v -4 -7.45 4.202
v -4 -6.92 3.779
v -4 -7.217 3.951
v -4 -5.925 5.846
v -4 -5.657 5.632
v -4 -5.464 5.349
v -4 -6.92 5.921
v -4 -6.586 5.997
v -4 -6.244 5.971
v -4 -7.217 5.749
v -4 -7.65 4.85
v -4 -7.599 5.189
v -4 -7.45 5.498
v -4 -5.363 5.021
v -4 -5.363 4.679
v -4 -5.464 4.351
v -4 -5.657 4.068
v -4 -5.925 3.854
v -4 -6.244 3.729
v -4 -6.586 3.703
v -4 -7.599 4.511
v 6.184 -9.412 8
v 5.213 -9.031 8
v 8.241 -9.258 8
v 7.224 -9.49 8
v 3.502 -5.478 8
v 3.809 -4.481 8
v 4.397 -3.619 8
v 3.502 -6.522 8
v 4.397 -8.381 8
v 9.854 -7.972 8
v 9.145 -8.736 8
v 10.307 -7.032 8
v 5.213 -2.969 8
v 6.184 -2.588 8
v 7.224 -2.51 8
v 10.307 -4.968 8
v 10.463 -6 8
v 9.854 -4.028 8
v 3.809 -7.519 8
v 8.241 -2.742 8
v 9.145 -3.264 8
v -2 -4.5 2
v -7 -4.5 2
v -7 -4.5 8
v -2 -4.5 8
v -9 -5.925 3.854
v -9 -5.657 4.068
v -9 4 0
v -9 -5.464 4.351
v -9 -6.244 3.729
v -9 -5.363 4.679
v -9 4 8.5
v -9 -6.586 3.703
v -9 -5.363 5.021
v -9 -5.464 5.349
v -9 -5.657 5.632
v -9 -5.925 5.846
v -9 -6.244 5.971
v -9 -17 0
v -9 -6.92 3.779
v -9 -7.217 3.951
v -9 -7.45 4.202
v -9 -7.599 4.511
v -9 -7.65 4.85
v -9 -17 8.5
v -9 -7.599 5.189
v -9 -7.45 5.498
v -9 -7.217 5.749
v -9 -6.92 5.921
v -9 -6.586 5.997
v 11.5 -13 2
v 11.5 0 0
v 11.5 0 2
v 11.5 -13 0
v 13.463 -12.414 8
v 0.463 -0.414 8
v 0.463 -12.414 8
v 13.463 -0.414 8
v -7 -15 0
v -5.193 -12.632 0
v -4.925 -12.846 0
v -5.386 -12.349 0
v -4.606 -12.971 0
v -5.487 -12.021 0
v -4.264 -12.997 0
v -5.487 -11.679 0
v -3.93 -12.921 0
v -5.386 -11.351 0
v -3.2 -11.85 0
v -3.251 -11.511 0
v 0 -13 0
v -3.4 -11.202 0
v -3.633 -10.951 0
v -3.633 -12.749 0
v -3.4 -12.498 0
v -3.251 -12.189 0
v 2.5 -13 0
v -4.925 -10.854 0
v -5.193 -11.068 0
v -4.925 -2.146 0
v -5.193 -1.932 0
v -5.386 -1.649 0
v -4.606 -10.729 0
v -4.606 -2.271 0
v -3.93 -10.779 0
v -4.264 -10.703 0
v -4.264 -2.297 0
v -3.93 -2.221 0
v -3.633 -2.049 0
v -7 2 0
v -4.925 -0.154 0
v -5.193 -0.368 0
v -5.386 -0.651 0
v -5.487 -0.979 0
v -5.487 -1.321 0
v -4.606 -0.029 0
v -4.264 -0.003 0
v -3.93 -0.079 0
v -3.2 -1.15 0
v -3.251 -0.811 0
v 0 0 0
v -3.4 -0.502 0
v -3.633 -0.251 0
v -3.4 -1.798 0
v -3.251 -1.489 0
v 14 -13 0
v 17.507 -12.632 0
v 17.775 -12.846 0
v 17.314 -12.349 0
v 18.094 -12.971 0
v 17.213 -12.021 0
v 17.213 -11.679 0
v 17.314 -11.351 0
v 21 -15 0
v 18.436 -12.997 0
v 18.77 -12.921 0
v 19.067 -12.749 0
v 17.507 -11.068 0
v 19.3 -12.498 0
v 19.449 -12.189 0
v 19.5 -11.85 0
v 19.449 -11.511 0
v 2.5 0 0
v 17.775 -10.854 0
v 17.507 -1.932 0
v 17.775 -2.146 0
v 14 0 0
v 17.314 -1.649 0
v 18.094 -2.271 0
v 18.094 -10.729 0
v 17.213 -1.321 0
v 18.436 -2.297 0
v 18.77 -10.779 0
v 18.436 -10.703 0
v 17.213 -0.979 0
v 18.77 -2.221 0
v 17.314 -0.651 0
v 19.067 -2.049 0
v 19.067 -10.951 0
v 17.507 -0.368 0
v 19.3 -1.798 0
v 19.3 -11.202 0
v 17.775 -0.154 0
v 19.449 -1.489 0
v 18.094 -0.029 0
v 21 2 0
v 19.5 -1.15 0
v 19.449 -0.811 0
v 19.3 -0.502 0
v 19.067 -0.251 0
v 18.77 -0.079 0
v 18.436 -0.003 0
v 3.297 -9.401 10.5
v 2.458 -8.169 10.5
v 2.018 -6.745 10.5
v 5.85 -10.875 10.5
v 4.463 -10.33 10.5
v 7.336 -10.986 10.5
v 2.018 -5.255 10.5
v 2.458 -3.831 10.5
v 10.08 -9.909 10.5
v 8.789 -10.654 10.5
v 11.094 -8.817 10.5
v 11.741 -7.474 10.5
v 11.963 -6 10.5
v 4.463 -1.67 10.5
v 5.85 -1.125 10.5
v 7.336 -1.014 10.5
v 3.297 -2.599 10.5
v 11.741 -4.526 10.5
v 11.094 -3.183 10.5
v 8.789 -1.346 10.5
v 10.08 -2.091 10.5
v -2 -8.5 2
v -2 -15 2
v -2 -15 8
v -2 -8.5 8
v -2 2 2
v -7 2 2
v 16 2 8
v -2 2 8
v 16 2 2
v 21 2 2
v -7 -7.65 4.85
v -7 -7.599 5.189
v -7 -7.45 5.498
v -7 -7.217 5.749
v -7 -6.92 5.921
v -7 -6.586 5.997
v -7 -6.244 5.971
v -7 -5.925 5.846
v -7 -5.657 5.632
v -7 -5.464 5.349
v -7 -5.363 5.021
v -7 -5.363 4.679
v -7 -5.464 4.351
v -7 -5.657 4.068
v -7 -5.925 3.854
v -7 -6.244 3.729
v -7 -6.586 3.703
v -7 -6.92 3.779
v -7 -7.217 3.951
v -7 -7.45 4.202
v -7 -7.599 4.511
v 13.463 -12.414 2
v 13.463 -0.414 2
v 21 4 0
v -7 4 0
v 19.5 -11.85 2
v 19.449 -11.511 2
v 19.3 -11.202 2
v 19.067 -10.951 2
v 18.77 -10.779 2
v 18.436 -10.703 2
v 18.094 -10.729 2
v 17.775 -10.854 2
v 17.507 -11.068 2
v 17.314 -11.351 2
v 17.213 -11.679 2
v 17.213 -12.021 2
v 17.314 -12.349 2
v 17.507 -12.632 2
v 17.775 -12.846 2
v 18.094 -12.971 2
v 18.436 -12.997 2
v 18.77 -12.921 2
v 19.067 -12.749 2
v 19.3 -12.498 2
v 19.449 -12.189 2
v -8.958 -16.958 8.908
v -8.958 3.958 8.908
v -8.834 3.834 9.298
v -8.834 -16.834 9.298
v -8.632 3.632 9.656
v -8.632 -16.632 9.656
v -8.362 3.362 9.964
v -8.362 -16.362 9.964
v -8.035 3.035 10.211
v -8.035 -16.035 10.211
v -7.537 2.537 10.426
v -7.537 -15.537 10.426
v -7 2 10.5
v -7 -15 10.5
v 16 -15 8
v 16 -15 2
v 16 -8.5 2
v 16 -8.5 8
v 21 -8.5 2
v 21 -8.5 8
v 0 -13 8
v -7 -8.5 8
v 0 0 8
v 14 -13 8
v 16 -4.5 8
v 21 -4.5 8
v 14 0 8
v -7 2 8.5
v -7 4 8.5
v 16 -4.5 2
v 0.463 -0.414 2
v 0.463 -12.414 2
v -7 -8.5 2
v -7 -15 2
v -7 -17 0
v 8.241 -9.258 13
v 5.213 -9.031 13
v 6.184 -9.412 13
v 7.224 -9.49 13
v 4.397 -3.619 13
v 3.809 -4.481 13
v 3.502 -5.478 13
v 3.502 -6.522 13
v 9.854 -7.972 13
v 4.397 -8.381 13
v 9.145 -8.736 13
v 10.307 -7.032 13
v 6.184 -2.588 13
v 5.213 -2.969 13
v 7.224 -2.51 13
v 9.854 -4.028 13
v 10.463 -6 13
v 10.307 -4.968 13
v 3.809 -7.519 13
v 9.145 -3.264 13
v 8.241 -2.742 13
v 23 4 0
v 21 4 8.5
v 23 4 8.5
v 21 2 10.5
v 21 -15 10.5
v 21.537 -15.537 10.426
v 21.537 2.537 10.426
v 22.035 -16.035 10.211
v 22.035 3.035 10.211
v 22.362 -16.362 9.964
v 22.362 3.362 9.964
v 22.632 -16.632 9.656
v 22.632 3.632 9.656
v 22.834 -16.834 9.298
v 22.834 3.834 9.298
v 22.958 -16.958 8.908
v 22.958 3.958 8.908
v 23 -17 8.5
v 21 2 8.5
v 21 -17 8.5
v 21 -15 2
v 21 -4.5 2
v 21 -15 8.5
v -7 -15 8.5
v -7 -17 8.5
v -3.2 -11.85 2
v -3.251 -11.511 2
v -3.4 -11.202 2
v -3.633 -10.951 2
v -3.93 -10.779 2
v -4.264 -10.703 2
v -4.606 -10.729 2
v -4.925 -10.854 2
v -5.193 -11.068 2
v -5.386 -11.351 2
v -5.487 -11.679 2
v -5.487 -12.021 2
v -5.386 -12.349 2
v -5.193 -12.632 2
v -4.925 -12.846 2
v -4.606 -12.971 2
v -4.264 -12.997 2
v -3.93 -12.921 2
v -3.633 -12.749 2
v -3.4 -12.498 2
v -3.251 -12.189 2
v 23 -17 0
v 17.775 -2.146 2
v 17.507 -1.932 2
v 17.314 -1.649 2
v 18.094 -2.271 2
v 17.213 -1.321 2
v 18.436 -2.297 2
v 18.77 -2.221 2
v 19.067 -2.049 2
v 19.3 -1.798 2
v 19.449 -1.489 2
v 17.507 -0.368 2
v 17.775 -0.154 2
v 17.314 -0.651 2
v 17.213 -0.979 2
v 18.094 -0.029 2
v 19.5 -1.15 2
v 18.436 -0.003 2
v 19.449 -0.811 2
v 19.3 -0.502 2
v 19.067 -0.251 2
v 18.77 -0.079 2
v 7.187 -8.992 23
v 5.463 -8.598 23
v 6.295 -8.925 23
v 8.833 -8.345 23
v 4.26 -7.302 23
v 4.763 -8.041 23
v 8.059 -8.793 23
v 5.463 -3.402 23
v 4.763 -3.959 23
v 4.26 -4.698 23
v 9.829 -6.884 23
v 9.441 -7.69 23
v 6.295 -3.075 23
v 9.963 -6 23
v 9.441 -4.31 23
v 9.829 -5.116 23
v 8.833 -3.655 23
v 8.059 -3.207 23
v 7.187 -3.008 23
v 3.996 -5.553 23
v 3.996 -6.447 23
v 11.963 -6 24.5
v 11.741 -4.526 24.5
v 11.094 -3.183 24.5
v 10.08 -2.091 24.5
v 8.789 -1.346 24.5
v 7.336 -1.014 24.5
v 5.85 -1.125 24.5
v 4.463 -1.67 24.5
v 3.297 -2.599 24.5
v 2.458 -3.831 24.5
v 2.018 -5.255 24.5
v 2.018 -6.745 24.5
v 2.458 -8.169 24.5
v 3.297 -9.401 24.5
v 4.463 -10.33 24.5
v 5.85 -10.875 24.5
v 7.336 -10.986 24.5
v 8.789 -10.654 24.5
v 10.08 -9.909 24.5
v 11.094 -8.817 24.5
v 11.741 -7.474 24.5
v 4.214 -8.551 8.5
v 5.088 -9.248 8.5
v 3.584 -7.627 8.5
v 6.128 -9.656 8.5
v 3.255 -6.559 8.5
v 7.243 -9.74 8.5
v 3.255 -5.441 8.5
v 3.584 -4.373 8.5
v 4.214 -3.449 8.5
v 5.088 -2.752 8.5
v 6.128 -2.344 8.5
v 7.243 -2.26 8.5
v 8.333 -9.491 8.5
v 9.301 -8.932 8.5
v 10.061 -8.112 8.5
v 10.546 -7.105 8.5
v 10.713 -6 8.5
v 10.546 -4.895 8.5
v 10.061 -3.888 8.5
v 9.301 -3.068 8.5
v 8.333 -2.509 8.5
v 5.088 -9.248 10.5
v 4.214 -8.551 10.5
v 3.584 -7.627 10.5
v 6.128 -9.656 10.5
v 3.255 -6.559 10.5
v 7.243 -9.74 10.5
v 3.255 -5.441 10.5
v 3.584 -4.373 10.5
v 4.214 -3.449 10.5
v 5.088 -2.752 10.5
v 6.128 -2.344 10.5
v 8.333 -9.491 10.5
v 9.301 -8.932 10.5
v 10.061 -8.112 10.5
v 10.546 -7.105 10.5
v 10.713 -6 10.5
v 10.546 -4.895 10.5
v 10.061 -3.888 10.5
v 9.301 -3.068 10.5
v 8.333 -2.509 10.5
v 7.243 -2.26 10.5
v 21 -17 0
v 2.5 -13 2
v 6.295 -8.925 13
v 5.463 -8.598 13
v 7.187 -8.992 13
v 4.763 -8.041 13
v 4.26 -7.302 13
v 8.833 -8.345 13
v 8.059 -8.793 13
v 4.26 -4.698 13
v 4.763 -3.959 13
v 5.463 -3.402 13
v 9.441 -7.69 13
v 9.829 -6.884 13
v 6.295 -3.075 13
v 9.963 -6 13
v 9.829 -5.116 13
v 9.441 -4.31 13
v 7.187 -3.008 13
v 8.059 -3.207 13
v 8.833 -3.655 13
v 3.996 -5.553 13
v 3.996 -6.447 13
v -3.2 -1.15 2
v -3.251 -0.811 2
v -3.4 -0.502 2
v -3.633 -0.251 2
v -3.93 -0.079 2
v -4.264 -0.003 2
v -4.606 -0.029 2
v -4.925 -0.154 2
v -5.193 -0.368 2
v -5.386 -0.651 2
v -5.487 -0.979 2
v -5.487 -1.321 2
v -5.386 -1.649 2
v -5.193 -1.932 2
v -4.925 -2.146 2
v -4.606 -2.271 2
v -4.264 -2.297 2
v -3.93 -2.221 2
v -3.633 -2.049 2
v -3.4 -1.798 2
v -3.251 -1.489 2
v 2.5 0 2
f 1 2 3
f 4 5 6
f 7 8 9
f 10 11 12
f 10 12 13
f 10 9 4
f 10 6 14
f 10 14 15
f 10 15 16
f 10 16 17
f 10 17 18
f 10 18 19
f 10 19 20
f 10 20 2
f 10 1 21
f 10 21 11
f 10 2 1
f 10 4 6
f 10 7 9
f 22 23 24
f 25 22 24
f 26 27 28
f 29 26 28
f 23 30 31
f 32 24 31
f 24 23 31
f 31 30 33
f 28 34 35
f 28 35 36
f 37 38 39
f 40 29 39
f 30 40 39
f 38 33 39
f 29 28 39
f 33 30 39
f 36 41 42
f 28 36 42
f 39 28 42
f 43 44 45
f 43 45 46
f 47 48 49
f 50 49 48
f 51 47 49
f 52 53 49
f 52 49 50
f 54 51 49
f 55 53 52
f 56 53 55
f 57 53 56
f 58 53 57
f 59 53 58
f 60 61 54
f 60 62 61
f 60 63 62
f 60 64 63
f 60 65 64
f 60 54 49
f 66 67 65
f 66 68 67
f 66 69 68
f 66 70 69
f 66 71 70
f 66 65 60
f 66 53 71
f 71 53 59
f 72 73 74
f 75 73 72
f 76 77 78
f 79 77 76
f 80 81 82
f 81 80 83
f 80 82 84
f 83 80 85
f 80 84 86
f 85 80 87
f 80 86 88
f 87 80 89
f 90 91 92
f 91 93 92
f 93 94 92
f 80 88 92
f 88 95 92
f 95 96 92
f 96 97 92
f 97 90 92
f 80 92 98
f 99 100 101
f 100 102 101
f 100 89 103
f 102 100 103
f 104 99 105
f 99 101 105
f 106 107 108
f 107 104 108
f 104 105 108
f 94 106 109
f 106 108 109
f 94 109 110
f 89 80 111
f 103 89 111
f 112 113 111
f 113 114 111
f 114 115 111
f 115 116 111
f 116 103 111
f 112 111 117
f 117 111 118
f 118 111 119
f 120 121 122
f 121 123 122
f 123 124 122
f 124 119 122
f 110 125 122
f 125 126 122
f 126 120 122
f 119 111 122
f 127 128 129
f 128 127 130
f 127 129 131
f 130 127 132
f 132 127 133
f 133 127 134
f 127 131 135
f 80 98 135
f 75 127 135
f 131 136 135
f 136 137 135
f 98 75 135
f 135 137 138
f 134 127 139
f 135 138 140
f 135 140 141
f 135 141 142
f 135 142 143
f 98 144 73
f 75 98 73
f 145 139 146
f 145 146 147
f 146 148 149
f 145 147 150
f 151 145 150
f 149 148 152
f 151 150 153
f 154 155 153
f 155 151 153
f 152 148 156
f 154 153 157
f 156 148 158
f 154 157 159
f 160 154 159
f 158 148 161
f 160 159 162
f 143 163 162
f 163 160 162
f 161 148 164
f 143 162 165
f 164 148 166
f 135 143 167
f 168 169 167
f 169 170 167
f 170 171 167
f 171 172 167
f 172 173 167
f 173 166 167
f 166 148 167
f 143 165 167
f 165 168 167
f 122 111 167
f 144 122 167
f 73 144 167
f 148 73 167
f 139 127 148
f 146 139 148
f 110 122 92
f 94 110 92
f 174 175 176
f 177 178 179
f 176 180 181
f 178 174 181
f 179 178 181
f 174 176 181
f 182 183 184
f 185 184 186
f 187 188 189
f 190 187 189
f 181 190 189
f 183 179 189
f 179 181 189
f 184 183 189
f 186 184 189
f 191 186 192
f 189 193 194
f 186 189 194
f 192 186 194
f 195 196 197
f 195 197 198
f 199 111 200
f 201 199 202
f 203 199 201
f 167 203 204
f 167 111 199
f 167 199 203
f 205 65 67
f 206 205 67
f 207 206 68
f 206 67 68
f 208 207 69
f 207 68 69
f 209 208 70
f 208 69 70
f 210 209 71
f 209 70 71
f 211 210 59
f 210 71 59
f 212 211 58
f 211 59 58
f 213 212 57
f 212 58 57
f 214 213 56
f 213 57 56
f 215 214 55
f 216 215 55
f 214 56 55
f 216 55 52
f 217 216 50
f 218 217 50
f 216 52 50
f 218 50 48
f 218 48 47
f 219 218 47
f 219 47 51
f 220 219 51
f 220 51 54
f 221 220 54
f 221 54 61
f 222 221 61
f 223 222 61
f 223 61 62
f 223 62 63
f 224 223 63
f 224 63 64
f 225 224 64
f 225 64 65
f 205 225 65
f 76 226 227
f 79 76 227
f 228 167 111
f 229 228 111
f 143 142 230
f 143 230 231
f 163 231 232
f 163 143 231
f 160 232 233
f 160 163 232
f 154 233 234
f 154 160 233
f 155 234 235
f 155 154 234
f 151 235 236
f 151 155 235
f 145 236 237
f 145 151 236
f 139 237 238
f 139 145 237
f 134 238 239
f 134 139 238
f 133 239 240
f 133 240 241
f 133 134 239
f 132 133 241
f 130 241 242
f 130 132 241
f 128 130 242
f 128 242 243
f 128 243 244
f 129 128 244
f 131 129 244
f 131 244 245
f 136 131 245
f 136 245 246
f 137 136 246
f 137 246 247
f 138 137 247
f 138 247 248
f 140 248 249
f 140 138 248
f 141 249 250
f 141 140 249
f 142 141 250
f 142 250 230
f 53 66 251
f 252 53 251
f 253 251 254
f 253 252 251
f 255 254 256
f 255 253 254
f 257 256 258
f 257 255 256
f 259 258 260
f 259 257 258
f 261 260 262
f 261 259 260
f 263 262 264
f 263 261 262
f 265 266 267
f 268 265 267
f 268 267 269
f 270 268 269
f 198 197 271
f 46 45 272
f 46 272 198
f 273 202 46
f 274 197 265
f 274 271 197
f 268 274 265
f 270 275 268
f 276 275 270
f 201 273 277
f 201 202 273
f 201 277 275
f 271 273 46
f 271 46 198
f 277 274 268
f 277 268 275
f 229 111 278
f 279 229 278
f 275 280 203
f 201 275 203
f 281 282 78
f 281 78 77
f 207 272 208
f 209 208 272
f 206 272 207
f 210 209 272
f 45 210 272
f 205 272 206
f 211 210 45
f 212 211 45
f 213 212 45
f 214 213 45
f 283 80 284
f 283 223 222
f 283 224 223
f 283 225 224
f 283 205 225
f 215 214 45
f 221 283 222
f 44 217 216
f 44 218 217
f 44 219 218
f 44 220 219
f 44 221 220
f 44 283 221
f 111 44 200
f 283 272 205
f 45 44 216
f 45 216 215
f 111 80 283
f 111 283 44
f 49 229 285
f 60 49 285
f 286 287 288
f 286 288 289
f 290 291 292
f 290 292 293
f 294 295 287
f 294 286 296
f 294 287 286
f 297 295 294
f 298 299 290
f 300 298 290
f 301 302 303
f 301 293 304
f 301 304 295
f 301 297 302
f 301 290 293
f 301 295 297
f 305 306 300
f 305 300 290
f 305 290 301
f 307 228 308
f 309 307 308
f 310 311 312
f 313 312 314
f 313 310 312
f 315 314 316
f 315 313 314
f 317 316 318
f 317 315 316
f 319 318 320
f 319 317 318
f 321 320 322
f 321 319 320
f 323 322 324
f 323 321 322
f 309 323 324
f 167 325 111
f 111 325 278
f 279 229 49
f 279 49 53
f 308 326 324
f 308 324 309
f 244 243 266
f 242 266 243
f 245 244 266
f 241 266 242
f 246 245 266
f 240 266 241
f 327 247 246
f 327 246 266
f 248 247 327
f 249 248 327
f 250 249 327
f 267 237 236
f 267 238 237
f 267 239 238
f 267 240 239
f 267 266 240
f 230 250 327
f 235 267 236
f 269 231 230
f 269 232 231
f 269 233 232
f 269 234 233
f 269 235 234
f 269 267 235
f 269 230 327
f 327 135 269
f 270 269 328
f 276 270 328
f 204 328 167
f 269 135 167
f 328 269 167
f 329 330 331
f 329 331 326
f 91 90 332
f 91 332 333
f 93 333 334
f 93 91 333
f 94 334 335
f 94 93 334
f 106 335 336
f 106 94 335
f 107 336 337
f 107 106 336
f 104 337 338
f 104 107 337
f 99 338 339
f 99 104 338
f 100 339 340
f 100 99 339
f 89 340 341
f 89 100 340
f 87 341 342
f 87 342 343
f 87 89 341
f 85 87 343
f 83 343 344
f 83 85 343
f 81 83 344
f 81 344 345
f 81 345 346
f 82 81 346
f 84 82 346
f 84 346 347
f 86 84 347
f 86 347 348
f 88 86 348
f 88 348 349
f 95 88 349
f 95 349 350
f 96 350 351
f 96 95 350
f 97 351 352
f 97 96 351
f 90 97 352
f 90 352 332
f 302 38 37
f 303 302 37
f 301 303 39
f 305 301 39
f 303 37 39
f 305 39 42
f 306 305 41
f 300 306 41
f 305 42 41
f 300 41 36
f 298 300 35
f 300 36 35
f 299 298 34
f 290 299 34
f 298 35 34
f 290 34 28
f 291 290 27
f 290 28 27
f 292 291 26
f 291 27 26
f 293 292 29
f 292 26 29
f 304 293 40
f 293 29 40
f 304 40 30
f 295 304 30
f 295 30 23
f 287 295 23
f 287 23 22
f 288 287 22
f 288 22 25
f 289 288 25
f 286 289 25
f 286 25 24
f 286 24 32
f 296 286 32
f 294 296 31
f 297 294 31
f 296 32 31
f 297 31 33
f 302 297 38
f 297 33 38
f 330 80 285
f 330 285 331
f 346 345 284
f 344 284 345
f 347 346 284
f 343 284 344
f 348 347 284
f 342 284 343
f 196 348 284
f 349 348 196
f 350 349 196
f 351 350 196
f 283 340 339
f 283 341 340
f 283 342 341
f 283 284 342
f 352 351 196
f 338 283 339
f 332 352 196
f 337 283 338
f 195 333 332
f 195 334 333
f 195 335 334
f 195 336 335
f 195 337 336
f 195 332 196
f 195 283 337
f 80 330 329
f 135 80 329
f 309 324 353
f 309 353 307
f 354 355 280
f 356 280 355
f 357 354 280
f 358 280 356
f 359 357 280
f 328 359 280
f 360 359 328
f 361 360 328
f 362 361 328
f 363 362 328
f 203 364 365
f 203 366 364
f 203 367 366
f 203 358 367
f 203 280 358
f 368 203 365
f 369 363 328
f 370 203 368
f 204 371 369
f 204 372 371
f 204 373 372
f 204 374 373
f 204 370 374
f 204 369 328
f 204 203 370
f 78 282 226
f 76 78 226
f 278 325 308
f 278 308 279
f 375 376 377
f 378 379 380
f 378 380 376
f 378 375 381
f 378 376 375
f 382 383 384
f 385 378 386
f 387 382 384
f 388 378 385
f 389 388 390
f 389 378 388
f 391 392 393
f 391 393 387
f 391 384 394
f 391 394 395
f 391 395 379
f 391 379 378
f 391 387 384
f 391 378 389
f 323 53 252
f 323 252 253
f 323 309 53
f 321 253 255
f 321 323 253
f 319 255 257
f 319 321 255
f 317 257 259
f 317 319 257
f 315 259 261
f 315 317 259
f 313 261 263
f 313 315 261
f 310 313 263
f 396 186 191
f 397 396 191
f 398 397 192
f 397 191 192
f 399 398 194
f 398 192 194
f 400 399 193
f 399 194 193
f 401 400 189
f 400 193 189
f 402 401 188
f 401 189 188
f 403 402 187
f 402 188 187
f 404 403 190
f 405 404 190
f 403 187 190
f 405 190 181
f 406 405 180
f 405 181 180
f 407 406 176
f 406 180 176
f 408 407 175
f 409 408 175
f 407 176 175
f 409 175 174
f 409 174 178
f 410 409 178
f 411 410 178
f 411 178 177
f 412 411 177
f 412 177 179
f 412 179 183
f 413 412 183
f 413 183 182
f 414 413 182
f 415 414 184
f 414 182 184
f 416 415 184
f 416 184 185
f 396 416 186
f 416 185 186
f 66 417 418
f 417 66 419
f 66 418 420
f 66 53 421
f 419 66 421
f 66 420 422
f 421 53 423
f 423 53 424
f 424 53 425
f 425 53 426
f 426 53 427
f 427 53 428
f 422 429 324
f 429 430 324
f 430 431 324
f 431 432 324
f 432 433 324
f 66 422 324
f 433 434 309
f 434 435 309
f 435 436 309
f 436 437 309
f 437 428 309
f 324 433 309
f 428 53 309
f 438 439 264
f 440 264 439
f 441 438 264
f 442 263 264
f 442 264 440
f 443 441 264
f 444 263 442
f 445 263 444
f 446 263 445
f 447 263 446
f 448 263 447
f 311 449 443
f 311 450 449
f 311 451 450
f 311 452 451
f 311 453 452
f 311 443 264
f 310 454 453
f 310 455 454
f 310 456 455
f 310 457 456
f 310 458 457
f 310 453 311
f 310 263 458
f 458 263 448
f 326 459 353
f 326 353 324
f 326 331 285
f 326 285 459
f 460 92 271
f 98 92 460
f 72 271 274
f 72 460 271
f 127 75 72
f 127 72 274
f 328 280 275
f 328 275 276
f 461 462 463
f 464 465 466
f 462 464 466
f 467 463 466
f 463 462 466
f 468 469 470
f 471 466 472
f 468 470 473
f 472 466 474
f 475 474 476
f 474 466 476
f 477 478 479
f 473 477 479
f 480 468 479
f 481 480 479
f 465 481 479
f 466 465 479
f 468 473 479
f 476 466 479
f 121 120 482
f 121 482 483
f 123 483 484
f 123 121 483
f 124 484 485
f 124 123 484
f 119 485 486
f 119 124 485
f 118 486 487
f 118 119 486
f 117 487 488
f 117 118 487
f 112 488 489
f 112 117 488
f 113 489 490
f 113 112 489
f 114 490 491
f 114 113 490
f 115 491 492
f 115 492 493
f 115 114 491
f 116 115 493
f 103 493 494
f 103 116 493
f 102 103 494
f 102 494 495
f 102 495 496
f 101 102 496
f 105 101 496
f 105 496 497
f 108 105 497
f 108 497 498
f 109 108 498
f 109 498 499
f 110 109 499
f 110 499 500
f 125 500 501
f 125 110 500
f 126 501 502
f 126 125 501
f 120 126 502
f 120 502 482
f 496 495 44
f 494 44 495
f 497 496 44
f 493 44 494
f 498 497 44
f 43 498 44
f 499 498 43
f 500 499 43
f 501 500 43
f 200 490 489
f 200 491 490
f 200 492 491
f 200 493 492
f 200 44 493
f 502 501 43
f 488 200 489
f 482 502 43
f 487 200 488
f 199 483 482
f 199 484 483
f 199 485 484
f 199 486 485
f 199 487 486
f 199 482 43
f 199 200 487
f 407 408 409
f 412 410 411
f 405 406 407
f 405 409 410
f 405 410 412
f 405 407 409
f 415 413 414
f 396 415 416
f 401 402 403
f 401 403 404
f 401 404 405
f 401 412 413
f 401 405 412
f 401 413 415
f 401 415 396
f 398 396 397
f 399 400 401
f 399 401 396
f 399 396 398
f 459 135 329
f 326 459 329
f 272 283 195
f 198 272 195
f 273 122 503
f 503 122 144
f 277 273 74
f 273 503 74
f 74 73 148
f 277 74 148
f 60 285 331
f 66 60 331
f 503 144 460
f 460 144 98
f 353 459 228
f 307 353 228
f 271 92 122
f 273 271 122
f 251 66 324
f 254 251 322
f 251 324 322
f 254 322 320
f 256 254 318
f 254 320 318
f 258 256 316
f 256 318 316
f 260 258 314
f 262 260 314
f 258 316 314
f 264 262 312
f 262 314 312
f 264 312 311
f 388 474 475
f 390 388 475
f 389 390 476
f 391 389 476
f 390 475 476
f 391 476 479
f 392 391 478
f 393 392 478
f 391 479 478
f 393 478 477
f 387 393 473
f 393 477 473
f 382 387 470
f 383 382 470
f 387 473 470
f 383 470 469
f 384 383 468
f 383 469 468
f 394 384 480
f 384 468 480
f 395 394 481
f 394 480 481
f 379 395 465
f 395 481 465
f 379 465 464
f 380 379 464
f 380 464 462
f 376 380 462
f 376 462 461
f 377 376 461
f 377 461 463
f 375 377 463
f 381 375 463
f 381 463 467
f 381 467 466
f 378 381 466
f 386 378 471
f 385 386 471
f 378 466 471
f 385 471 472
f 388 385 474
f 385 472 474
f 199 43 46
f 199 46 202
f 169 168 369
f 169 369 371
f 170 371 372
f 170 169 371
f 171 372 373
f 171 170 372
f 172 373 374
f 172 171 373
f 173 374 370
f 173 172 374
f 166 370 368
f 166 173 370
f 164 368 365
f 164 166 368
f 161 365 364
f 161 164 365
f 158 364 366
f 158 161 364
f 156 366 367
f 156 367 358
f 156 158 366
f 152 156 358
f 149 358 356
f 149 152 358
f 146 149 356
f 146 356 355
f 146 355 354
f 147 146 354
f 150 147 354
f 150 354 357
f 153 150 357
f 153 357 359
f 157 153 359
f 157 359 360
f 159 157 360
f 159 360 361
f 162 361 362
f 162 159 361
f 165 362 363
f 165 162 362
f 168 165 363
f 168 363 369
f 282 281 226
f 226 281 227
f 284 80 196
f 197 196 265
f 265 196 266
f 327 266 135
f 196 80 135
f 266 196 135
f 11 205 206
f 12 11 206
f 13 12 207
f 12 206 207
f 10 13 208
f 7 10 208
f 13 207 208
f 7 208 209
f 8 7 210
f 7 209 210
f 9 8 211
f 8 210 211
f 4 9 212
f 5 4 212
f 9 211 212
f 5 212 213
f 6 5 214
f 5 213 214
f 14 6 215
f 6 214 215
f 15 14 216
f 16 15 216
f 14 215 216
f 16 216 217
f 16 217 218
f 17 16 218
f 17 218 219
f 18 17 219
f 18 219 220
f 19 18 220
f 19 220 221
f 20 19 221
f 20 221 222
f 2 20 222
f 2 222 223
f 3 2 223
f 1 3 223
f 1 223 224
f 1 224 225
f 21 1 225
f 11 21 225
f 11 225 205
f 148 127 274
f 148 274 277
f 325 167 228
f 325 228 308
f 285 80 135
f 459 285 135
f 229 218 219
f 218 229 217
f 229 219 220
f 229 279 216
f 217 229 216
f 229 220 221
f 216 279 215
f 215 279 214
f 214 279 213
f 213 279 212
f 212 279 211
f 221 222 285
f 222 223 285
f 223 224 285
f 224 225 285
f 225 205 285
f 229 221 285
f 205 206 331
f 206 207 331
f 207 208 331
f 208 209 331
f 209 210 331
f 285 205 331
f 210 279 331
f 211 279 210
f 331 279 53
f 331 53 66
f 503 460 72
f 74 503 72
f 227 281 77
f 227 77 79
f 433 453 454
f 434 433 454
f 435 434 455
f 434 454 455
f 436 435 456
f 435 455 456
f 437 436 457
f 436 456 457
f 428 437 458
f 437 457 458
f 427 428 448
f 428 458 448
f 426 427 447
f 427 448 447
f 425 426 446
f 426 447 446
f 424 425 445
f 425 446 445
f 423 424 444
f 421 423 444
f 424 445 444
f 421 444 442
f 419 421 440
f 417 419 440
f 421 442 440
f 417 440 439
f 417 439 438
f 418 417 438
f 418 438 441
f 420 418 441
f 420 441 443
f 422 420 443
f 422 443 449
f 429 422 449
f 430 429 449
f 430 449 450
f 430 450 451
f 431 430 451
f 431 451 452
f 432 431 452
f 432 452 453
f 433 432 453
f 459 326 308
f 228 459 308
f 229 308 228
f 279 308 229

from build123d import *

# Parameters (mm, degrees)
F0_W      = 18
F0_H      = 17
F0_W_2    = 14
F0_H_2    = 13
F1_DEPTH  = 8
F2_W      = 9
F2_H      = 13
F3_DEPTH  = 2
F5_W      = 13
F5_H      = 12
F6_DEPTH  = 6
F7_R      = 3.5
F8_DEPTH  = 5
F9_R      = 3
F10_DEPTH = 10
F11_W     = 5
F11_H     = 17
F11_R     = 1.15
F12_DEPTH = 2
F13_W     = 5
F13_H     = 4
F14_DEPTH = 6
F15_W     = 28
F15_H     = 8.5
F16_DEPTH = 2
F17_W     = 21
F17_H     = 8.5
F18_DEPTH = 2
F19_W     = 28
F19_H     = 8.5
F20_DEPTH = 2
F21_W     = 21
F21_H     = 8.5
F22_DEPTH = 2
F23_R     = 1.15
F24_DEPTH = 5
F25_W     = 32
F25_H     = 21
F26_DEPTH = 2
F27_R     = 3.75
F28_DEPTH = 5
F29_R     = 5
F30_DEPTH = 14
F31_R     = 1.99999


# Not quite as in the source:
# - a fillet or chamfer is up to 0.001 mm smaller than in the source, because OpenCascade refuses the exact size


with BuildPart() as f1:
    # F0 (on Top) → F1 (new body)
    with BuildSketch(Plane.XY):
        with Locations((7, -6.5)):
            Rectangle(F0_W, F0_H)
        with Locations((7, -6.5)):
            Rectangle(F0_W_2, F0_H_2, mode=Mode.SUBTRACT)
    extrude(amount=F1_DEPTH)

    # F2 (on face) → F3 (join)
    with BuildSketch(Plane(origin=(0, 0, 0), x_dir=(1, 0, 0), z_dir=(0, 0, -1))):
        with Locations((7, 6.5)):
            Rectangle(F2_W, F2_H)
    extrude(amount=-F3_DEPTH)

    # F11 (on Top) → F12 (join)
    with BuildSketch(Plane.XY):
        with Locations((-4.5, -6.5)):
            Rectangle(F11_W, F11_H)
        with Locations((-4.35, -11.85)):
            Circle(F11_R, mode=Mode.SUBTRACT)
        with Locations((-4.35, -1.15)):
            Circle(F11_R, mode=Mode.SUBTRACT)
        with Locations((18.5, -6.5)):
            Rectangle(F11_W, F11_H)
        with Locations((18.35, -11.85)):
            Circle(F11_R, mode=Mode.SUBTRACT)
        with Locations((18.35, -1.15)):
            Circle(F11_R, mode=Mode.SUBTRACT)
    extrude(amount=F12_DEPTH)

    # F13 (on face) → F14 (join)
    with BuildSketch(Plane.XY.offset(2)):
        with Locations((-4.5, -6.5)):
            Rectangle(F13_W, F13_H)
        with Locations((18.5, -6.5)):
            Rectangle(F13_W, F13_H)
    extrude(amount=F14_DEPTH)


with BuildPart() as f6:
    # F5 (on face) → F6 (new body)
    with BuildSketch(Plane.XY.offset(2)):
        with Locations((6.9626439363, -6.4136818983)):
            Rectangle(F5_W, F5_H)
    extrude(amount=F6_DEPTH)


with BuildPart() as f8:
    # F7 (on face) → F8 (new body)
    with BuildSketch(Plane.XY.offset(8)):
        with Locations((6.9626439363, -6)):
            Circle(F7_R)
    extrude(amount=F8_DEPTH)


with BuildPart() as f10:
    # F9 (on face) → F10 (new body)
    with BuildSketch(Plane.XY.offset(13)):
        with Locations((6.9626439363, -6)):
            Circle(F9_R)
    extrude(amount=F10_DEPTH)


with BuildPart() as f16:
    # F15 (on face) → F16 (new body)
    with BuildSketch(Plane.XZ.offset(15)):
        with Locations((7, 4.25)):
            Rectangle(F15_W, F15_H)
    extrude(amount=F16_DEPTH)


with BuildPart() as f18:
    # F17 (on face) → F18 (new body)
    with BuildSketch(Plane.YZ.offset(21)):
        with Locations((-6.5, 4.25)):
            Rectangle(F17_W, F17_H)
    extrude(amount=F18_DEPTH)


with BuildPart() as f20:
    # F19 (on face) → F20 (new body)
    with BuildSketch(Plane(origin=(0, 2, 0), x_dir=(-1, 0, 0), z_dir=(0, 1, 0))):
        with Locations((-7, 4.25)):
            Rectangle(F19_W, F19_H)
    extrude(amount=F20_DEPTH)


with BuildPart() as f22:
    # F21 (on face) → F22 (new body)
    with BuildSketch(Plane(origin=(-7, 0, 0), x_dir=(0, -1, 0), z_dir=(-1, 0, 0))):
        with Locations((6.5, 4.25)):
            Rectangle(F21_W, F21_H)
    extrude(amount=F22_DEPTH)


with BuildPart() as f24_tool:
    # F23 (on face) → F24 (new body)
    with BuildSketch(Plane(origin=(-9, 0, 0), x_dir=(0, -1, 0), z_dir=(-1, 0, 0))):
        with Locations((6.5, 4.85)):
            Circle(F23_R)
    extrude(amount=-F24_DEPTH)


with BuildPart() as f1_1:
    add(f1.part)

    # F24: cut by f24_tool
    add(f24_tool.part, mode=Mode.SUBTRACT)


with BuildPart() as f22_1:
    add(f22.part)

    # F24: cut by f24_tool
    add(f24_tool.part, mode=Mode.SUBTRACT)


with BuildPart() as f26:
    # F25 (on face) → F26 (new body)
    with BuildSketch(Plane.XY.offset(8.5)):
        with Locations((7, -6.5)):
            Rectangle(F25_W, F25_H)
    extrude(amount=F26_DEPTH)

    # F27 (on face) → F28 (cut)
    with BuildSketch(Plane.XY.offset(13)):
        with Locations((6.9626439363, -6)):
            Circle(F27_R)
    extrude(amount=-F28_DEPTH, mode=Mode.SUBTRACT)

    # F31 (radius 2 in the source; OpenCascade refuses exactly that, so slightly less here)
    f31_edges = [f26.edges().sort_by_distance(p)[0] for p in [
        (-9, -6.5, 10.5),
        (7, 4, 10.5),
        (7, -17, 10.5),
        (23, -6.5, 10.5),
    ]]
    fillet(f31_edges, radius=F31_R)


with BuildPart() as f30:
    # F29 (on face) → F30 (new body)
    with BuildSketch(Plane.XY.offset(10.5)):
        with Locations((6.9626439363, -6)):
            Circle(F29_R)
    extrude(amount=F30_DEPTH)


solid = Compound([f6.part, f8.part, f10.part, f16.part, f18.part, f20.part, f1_1.part, f22_1.part, f26.part, f30.part])
